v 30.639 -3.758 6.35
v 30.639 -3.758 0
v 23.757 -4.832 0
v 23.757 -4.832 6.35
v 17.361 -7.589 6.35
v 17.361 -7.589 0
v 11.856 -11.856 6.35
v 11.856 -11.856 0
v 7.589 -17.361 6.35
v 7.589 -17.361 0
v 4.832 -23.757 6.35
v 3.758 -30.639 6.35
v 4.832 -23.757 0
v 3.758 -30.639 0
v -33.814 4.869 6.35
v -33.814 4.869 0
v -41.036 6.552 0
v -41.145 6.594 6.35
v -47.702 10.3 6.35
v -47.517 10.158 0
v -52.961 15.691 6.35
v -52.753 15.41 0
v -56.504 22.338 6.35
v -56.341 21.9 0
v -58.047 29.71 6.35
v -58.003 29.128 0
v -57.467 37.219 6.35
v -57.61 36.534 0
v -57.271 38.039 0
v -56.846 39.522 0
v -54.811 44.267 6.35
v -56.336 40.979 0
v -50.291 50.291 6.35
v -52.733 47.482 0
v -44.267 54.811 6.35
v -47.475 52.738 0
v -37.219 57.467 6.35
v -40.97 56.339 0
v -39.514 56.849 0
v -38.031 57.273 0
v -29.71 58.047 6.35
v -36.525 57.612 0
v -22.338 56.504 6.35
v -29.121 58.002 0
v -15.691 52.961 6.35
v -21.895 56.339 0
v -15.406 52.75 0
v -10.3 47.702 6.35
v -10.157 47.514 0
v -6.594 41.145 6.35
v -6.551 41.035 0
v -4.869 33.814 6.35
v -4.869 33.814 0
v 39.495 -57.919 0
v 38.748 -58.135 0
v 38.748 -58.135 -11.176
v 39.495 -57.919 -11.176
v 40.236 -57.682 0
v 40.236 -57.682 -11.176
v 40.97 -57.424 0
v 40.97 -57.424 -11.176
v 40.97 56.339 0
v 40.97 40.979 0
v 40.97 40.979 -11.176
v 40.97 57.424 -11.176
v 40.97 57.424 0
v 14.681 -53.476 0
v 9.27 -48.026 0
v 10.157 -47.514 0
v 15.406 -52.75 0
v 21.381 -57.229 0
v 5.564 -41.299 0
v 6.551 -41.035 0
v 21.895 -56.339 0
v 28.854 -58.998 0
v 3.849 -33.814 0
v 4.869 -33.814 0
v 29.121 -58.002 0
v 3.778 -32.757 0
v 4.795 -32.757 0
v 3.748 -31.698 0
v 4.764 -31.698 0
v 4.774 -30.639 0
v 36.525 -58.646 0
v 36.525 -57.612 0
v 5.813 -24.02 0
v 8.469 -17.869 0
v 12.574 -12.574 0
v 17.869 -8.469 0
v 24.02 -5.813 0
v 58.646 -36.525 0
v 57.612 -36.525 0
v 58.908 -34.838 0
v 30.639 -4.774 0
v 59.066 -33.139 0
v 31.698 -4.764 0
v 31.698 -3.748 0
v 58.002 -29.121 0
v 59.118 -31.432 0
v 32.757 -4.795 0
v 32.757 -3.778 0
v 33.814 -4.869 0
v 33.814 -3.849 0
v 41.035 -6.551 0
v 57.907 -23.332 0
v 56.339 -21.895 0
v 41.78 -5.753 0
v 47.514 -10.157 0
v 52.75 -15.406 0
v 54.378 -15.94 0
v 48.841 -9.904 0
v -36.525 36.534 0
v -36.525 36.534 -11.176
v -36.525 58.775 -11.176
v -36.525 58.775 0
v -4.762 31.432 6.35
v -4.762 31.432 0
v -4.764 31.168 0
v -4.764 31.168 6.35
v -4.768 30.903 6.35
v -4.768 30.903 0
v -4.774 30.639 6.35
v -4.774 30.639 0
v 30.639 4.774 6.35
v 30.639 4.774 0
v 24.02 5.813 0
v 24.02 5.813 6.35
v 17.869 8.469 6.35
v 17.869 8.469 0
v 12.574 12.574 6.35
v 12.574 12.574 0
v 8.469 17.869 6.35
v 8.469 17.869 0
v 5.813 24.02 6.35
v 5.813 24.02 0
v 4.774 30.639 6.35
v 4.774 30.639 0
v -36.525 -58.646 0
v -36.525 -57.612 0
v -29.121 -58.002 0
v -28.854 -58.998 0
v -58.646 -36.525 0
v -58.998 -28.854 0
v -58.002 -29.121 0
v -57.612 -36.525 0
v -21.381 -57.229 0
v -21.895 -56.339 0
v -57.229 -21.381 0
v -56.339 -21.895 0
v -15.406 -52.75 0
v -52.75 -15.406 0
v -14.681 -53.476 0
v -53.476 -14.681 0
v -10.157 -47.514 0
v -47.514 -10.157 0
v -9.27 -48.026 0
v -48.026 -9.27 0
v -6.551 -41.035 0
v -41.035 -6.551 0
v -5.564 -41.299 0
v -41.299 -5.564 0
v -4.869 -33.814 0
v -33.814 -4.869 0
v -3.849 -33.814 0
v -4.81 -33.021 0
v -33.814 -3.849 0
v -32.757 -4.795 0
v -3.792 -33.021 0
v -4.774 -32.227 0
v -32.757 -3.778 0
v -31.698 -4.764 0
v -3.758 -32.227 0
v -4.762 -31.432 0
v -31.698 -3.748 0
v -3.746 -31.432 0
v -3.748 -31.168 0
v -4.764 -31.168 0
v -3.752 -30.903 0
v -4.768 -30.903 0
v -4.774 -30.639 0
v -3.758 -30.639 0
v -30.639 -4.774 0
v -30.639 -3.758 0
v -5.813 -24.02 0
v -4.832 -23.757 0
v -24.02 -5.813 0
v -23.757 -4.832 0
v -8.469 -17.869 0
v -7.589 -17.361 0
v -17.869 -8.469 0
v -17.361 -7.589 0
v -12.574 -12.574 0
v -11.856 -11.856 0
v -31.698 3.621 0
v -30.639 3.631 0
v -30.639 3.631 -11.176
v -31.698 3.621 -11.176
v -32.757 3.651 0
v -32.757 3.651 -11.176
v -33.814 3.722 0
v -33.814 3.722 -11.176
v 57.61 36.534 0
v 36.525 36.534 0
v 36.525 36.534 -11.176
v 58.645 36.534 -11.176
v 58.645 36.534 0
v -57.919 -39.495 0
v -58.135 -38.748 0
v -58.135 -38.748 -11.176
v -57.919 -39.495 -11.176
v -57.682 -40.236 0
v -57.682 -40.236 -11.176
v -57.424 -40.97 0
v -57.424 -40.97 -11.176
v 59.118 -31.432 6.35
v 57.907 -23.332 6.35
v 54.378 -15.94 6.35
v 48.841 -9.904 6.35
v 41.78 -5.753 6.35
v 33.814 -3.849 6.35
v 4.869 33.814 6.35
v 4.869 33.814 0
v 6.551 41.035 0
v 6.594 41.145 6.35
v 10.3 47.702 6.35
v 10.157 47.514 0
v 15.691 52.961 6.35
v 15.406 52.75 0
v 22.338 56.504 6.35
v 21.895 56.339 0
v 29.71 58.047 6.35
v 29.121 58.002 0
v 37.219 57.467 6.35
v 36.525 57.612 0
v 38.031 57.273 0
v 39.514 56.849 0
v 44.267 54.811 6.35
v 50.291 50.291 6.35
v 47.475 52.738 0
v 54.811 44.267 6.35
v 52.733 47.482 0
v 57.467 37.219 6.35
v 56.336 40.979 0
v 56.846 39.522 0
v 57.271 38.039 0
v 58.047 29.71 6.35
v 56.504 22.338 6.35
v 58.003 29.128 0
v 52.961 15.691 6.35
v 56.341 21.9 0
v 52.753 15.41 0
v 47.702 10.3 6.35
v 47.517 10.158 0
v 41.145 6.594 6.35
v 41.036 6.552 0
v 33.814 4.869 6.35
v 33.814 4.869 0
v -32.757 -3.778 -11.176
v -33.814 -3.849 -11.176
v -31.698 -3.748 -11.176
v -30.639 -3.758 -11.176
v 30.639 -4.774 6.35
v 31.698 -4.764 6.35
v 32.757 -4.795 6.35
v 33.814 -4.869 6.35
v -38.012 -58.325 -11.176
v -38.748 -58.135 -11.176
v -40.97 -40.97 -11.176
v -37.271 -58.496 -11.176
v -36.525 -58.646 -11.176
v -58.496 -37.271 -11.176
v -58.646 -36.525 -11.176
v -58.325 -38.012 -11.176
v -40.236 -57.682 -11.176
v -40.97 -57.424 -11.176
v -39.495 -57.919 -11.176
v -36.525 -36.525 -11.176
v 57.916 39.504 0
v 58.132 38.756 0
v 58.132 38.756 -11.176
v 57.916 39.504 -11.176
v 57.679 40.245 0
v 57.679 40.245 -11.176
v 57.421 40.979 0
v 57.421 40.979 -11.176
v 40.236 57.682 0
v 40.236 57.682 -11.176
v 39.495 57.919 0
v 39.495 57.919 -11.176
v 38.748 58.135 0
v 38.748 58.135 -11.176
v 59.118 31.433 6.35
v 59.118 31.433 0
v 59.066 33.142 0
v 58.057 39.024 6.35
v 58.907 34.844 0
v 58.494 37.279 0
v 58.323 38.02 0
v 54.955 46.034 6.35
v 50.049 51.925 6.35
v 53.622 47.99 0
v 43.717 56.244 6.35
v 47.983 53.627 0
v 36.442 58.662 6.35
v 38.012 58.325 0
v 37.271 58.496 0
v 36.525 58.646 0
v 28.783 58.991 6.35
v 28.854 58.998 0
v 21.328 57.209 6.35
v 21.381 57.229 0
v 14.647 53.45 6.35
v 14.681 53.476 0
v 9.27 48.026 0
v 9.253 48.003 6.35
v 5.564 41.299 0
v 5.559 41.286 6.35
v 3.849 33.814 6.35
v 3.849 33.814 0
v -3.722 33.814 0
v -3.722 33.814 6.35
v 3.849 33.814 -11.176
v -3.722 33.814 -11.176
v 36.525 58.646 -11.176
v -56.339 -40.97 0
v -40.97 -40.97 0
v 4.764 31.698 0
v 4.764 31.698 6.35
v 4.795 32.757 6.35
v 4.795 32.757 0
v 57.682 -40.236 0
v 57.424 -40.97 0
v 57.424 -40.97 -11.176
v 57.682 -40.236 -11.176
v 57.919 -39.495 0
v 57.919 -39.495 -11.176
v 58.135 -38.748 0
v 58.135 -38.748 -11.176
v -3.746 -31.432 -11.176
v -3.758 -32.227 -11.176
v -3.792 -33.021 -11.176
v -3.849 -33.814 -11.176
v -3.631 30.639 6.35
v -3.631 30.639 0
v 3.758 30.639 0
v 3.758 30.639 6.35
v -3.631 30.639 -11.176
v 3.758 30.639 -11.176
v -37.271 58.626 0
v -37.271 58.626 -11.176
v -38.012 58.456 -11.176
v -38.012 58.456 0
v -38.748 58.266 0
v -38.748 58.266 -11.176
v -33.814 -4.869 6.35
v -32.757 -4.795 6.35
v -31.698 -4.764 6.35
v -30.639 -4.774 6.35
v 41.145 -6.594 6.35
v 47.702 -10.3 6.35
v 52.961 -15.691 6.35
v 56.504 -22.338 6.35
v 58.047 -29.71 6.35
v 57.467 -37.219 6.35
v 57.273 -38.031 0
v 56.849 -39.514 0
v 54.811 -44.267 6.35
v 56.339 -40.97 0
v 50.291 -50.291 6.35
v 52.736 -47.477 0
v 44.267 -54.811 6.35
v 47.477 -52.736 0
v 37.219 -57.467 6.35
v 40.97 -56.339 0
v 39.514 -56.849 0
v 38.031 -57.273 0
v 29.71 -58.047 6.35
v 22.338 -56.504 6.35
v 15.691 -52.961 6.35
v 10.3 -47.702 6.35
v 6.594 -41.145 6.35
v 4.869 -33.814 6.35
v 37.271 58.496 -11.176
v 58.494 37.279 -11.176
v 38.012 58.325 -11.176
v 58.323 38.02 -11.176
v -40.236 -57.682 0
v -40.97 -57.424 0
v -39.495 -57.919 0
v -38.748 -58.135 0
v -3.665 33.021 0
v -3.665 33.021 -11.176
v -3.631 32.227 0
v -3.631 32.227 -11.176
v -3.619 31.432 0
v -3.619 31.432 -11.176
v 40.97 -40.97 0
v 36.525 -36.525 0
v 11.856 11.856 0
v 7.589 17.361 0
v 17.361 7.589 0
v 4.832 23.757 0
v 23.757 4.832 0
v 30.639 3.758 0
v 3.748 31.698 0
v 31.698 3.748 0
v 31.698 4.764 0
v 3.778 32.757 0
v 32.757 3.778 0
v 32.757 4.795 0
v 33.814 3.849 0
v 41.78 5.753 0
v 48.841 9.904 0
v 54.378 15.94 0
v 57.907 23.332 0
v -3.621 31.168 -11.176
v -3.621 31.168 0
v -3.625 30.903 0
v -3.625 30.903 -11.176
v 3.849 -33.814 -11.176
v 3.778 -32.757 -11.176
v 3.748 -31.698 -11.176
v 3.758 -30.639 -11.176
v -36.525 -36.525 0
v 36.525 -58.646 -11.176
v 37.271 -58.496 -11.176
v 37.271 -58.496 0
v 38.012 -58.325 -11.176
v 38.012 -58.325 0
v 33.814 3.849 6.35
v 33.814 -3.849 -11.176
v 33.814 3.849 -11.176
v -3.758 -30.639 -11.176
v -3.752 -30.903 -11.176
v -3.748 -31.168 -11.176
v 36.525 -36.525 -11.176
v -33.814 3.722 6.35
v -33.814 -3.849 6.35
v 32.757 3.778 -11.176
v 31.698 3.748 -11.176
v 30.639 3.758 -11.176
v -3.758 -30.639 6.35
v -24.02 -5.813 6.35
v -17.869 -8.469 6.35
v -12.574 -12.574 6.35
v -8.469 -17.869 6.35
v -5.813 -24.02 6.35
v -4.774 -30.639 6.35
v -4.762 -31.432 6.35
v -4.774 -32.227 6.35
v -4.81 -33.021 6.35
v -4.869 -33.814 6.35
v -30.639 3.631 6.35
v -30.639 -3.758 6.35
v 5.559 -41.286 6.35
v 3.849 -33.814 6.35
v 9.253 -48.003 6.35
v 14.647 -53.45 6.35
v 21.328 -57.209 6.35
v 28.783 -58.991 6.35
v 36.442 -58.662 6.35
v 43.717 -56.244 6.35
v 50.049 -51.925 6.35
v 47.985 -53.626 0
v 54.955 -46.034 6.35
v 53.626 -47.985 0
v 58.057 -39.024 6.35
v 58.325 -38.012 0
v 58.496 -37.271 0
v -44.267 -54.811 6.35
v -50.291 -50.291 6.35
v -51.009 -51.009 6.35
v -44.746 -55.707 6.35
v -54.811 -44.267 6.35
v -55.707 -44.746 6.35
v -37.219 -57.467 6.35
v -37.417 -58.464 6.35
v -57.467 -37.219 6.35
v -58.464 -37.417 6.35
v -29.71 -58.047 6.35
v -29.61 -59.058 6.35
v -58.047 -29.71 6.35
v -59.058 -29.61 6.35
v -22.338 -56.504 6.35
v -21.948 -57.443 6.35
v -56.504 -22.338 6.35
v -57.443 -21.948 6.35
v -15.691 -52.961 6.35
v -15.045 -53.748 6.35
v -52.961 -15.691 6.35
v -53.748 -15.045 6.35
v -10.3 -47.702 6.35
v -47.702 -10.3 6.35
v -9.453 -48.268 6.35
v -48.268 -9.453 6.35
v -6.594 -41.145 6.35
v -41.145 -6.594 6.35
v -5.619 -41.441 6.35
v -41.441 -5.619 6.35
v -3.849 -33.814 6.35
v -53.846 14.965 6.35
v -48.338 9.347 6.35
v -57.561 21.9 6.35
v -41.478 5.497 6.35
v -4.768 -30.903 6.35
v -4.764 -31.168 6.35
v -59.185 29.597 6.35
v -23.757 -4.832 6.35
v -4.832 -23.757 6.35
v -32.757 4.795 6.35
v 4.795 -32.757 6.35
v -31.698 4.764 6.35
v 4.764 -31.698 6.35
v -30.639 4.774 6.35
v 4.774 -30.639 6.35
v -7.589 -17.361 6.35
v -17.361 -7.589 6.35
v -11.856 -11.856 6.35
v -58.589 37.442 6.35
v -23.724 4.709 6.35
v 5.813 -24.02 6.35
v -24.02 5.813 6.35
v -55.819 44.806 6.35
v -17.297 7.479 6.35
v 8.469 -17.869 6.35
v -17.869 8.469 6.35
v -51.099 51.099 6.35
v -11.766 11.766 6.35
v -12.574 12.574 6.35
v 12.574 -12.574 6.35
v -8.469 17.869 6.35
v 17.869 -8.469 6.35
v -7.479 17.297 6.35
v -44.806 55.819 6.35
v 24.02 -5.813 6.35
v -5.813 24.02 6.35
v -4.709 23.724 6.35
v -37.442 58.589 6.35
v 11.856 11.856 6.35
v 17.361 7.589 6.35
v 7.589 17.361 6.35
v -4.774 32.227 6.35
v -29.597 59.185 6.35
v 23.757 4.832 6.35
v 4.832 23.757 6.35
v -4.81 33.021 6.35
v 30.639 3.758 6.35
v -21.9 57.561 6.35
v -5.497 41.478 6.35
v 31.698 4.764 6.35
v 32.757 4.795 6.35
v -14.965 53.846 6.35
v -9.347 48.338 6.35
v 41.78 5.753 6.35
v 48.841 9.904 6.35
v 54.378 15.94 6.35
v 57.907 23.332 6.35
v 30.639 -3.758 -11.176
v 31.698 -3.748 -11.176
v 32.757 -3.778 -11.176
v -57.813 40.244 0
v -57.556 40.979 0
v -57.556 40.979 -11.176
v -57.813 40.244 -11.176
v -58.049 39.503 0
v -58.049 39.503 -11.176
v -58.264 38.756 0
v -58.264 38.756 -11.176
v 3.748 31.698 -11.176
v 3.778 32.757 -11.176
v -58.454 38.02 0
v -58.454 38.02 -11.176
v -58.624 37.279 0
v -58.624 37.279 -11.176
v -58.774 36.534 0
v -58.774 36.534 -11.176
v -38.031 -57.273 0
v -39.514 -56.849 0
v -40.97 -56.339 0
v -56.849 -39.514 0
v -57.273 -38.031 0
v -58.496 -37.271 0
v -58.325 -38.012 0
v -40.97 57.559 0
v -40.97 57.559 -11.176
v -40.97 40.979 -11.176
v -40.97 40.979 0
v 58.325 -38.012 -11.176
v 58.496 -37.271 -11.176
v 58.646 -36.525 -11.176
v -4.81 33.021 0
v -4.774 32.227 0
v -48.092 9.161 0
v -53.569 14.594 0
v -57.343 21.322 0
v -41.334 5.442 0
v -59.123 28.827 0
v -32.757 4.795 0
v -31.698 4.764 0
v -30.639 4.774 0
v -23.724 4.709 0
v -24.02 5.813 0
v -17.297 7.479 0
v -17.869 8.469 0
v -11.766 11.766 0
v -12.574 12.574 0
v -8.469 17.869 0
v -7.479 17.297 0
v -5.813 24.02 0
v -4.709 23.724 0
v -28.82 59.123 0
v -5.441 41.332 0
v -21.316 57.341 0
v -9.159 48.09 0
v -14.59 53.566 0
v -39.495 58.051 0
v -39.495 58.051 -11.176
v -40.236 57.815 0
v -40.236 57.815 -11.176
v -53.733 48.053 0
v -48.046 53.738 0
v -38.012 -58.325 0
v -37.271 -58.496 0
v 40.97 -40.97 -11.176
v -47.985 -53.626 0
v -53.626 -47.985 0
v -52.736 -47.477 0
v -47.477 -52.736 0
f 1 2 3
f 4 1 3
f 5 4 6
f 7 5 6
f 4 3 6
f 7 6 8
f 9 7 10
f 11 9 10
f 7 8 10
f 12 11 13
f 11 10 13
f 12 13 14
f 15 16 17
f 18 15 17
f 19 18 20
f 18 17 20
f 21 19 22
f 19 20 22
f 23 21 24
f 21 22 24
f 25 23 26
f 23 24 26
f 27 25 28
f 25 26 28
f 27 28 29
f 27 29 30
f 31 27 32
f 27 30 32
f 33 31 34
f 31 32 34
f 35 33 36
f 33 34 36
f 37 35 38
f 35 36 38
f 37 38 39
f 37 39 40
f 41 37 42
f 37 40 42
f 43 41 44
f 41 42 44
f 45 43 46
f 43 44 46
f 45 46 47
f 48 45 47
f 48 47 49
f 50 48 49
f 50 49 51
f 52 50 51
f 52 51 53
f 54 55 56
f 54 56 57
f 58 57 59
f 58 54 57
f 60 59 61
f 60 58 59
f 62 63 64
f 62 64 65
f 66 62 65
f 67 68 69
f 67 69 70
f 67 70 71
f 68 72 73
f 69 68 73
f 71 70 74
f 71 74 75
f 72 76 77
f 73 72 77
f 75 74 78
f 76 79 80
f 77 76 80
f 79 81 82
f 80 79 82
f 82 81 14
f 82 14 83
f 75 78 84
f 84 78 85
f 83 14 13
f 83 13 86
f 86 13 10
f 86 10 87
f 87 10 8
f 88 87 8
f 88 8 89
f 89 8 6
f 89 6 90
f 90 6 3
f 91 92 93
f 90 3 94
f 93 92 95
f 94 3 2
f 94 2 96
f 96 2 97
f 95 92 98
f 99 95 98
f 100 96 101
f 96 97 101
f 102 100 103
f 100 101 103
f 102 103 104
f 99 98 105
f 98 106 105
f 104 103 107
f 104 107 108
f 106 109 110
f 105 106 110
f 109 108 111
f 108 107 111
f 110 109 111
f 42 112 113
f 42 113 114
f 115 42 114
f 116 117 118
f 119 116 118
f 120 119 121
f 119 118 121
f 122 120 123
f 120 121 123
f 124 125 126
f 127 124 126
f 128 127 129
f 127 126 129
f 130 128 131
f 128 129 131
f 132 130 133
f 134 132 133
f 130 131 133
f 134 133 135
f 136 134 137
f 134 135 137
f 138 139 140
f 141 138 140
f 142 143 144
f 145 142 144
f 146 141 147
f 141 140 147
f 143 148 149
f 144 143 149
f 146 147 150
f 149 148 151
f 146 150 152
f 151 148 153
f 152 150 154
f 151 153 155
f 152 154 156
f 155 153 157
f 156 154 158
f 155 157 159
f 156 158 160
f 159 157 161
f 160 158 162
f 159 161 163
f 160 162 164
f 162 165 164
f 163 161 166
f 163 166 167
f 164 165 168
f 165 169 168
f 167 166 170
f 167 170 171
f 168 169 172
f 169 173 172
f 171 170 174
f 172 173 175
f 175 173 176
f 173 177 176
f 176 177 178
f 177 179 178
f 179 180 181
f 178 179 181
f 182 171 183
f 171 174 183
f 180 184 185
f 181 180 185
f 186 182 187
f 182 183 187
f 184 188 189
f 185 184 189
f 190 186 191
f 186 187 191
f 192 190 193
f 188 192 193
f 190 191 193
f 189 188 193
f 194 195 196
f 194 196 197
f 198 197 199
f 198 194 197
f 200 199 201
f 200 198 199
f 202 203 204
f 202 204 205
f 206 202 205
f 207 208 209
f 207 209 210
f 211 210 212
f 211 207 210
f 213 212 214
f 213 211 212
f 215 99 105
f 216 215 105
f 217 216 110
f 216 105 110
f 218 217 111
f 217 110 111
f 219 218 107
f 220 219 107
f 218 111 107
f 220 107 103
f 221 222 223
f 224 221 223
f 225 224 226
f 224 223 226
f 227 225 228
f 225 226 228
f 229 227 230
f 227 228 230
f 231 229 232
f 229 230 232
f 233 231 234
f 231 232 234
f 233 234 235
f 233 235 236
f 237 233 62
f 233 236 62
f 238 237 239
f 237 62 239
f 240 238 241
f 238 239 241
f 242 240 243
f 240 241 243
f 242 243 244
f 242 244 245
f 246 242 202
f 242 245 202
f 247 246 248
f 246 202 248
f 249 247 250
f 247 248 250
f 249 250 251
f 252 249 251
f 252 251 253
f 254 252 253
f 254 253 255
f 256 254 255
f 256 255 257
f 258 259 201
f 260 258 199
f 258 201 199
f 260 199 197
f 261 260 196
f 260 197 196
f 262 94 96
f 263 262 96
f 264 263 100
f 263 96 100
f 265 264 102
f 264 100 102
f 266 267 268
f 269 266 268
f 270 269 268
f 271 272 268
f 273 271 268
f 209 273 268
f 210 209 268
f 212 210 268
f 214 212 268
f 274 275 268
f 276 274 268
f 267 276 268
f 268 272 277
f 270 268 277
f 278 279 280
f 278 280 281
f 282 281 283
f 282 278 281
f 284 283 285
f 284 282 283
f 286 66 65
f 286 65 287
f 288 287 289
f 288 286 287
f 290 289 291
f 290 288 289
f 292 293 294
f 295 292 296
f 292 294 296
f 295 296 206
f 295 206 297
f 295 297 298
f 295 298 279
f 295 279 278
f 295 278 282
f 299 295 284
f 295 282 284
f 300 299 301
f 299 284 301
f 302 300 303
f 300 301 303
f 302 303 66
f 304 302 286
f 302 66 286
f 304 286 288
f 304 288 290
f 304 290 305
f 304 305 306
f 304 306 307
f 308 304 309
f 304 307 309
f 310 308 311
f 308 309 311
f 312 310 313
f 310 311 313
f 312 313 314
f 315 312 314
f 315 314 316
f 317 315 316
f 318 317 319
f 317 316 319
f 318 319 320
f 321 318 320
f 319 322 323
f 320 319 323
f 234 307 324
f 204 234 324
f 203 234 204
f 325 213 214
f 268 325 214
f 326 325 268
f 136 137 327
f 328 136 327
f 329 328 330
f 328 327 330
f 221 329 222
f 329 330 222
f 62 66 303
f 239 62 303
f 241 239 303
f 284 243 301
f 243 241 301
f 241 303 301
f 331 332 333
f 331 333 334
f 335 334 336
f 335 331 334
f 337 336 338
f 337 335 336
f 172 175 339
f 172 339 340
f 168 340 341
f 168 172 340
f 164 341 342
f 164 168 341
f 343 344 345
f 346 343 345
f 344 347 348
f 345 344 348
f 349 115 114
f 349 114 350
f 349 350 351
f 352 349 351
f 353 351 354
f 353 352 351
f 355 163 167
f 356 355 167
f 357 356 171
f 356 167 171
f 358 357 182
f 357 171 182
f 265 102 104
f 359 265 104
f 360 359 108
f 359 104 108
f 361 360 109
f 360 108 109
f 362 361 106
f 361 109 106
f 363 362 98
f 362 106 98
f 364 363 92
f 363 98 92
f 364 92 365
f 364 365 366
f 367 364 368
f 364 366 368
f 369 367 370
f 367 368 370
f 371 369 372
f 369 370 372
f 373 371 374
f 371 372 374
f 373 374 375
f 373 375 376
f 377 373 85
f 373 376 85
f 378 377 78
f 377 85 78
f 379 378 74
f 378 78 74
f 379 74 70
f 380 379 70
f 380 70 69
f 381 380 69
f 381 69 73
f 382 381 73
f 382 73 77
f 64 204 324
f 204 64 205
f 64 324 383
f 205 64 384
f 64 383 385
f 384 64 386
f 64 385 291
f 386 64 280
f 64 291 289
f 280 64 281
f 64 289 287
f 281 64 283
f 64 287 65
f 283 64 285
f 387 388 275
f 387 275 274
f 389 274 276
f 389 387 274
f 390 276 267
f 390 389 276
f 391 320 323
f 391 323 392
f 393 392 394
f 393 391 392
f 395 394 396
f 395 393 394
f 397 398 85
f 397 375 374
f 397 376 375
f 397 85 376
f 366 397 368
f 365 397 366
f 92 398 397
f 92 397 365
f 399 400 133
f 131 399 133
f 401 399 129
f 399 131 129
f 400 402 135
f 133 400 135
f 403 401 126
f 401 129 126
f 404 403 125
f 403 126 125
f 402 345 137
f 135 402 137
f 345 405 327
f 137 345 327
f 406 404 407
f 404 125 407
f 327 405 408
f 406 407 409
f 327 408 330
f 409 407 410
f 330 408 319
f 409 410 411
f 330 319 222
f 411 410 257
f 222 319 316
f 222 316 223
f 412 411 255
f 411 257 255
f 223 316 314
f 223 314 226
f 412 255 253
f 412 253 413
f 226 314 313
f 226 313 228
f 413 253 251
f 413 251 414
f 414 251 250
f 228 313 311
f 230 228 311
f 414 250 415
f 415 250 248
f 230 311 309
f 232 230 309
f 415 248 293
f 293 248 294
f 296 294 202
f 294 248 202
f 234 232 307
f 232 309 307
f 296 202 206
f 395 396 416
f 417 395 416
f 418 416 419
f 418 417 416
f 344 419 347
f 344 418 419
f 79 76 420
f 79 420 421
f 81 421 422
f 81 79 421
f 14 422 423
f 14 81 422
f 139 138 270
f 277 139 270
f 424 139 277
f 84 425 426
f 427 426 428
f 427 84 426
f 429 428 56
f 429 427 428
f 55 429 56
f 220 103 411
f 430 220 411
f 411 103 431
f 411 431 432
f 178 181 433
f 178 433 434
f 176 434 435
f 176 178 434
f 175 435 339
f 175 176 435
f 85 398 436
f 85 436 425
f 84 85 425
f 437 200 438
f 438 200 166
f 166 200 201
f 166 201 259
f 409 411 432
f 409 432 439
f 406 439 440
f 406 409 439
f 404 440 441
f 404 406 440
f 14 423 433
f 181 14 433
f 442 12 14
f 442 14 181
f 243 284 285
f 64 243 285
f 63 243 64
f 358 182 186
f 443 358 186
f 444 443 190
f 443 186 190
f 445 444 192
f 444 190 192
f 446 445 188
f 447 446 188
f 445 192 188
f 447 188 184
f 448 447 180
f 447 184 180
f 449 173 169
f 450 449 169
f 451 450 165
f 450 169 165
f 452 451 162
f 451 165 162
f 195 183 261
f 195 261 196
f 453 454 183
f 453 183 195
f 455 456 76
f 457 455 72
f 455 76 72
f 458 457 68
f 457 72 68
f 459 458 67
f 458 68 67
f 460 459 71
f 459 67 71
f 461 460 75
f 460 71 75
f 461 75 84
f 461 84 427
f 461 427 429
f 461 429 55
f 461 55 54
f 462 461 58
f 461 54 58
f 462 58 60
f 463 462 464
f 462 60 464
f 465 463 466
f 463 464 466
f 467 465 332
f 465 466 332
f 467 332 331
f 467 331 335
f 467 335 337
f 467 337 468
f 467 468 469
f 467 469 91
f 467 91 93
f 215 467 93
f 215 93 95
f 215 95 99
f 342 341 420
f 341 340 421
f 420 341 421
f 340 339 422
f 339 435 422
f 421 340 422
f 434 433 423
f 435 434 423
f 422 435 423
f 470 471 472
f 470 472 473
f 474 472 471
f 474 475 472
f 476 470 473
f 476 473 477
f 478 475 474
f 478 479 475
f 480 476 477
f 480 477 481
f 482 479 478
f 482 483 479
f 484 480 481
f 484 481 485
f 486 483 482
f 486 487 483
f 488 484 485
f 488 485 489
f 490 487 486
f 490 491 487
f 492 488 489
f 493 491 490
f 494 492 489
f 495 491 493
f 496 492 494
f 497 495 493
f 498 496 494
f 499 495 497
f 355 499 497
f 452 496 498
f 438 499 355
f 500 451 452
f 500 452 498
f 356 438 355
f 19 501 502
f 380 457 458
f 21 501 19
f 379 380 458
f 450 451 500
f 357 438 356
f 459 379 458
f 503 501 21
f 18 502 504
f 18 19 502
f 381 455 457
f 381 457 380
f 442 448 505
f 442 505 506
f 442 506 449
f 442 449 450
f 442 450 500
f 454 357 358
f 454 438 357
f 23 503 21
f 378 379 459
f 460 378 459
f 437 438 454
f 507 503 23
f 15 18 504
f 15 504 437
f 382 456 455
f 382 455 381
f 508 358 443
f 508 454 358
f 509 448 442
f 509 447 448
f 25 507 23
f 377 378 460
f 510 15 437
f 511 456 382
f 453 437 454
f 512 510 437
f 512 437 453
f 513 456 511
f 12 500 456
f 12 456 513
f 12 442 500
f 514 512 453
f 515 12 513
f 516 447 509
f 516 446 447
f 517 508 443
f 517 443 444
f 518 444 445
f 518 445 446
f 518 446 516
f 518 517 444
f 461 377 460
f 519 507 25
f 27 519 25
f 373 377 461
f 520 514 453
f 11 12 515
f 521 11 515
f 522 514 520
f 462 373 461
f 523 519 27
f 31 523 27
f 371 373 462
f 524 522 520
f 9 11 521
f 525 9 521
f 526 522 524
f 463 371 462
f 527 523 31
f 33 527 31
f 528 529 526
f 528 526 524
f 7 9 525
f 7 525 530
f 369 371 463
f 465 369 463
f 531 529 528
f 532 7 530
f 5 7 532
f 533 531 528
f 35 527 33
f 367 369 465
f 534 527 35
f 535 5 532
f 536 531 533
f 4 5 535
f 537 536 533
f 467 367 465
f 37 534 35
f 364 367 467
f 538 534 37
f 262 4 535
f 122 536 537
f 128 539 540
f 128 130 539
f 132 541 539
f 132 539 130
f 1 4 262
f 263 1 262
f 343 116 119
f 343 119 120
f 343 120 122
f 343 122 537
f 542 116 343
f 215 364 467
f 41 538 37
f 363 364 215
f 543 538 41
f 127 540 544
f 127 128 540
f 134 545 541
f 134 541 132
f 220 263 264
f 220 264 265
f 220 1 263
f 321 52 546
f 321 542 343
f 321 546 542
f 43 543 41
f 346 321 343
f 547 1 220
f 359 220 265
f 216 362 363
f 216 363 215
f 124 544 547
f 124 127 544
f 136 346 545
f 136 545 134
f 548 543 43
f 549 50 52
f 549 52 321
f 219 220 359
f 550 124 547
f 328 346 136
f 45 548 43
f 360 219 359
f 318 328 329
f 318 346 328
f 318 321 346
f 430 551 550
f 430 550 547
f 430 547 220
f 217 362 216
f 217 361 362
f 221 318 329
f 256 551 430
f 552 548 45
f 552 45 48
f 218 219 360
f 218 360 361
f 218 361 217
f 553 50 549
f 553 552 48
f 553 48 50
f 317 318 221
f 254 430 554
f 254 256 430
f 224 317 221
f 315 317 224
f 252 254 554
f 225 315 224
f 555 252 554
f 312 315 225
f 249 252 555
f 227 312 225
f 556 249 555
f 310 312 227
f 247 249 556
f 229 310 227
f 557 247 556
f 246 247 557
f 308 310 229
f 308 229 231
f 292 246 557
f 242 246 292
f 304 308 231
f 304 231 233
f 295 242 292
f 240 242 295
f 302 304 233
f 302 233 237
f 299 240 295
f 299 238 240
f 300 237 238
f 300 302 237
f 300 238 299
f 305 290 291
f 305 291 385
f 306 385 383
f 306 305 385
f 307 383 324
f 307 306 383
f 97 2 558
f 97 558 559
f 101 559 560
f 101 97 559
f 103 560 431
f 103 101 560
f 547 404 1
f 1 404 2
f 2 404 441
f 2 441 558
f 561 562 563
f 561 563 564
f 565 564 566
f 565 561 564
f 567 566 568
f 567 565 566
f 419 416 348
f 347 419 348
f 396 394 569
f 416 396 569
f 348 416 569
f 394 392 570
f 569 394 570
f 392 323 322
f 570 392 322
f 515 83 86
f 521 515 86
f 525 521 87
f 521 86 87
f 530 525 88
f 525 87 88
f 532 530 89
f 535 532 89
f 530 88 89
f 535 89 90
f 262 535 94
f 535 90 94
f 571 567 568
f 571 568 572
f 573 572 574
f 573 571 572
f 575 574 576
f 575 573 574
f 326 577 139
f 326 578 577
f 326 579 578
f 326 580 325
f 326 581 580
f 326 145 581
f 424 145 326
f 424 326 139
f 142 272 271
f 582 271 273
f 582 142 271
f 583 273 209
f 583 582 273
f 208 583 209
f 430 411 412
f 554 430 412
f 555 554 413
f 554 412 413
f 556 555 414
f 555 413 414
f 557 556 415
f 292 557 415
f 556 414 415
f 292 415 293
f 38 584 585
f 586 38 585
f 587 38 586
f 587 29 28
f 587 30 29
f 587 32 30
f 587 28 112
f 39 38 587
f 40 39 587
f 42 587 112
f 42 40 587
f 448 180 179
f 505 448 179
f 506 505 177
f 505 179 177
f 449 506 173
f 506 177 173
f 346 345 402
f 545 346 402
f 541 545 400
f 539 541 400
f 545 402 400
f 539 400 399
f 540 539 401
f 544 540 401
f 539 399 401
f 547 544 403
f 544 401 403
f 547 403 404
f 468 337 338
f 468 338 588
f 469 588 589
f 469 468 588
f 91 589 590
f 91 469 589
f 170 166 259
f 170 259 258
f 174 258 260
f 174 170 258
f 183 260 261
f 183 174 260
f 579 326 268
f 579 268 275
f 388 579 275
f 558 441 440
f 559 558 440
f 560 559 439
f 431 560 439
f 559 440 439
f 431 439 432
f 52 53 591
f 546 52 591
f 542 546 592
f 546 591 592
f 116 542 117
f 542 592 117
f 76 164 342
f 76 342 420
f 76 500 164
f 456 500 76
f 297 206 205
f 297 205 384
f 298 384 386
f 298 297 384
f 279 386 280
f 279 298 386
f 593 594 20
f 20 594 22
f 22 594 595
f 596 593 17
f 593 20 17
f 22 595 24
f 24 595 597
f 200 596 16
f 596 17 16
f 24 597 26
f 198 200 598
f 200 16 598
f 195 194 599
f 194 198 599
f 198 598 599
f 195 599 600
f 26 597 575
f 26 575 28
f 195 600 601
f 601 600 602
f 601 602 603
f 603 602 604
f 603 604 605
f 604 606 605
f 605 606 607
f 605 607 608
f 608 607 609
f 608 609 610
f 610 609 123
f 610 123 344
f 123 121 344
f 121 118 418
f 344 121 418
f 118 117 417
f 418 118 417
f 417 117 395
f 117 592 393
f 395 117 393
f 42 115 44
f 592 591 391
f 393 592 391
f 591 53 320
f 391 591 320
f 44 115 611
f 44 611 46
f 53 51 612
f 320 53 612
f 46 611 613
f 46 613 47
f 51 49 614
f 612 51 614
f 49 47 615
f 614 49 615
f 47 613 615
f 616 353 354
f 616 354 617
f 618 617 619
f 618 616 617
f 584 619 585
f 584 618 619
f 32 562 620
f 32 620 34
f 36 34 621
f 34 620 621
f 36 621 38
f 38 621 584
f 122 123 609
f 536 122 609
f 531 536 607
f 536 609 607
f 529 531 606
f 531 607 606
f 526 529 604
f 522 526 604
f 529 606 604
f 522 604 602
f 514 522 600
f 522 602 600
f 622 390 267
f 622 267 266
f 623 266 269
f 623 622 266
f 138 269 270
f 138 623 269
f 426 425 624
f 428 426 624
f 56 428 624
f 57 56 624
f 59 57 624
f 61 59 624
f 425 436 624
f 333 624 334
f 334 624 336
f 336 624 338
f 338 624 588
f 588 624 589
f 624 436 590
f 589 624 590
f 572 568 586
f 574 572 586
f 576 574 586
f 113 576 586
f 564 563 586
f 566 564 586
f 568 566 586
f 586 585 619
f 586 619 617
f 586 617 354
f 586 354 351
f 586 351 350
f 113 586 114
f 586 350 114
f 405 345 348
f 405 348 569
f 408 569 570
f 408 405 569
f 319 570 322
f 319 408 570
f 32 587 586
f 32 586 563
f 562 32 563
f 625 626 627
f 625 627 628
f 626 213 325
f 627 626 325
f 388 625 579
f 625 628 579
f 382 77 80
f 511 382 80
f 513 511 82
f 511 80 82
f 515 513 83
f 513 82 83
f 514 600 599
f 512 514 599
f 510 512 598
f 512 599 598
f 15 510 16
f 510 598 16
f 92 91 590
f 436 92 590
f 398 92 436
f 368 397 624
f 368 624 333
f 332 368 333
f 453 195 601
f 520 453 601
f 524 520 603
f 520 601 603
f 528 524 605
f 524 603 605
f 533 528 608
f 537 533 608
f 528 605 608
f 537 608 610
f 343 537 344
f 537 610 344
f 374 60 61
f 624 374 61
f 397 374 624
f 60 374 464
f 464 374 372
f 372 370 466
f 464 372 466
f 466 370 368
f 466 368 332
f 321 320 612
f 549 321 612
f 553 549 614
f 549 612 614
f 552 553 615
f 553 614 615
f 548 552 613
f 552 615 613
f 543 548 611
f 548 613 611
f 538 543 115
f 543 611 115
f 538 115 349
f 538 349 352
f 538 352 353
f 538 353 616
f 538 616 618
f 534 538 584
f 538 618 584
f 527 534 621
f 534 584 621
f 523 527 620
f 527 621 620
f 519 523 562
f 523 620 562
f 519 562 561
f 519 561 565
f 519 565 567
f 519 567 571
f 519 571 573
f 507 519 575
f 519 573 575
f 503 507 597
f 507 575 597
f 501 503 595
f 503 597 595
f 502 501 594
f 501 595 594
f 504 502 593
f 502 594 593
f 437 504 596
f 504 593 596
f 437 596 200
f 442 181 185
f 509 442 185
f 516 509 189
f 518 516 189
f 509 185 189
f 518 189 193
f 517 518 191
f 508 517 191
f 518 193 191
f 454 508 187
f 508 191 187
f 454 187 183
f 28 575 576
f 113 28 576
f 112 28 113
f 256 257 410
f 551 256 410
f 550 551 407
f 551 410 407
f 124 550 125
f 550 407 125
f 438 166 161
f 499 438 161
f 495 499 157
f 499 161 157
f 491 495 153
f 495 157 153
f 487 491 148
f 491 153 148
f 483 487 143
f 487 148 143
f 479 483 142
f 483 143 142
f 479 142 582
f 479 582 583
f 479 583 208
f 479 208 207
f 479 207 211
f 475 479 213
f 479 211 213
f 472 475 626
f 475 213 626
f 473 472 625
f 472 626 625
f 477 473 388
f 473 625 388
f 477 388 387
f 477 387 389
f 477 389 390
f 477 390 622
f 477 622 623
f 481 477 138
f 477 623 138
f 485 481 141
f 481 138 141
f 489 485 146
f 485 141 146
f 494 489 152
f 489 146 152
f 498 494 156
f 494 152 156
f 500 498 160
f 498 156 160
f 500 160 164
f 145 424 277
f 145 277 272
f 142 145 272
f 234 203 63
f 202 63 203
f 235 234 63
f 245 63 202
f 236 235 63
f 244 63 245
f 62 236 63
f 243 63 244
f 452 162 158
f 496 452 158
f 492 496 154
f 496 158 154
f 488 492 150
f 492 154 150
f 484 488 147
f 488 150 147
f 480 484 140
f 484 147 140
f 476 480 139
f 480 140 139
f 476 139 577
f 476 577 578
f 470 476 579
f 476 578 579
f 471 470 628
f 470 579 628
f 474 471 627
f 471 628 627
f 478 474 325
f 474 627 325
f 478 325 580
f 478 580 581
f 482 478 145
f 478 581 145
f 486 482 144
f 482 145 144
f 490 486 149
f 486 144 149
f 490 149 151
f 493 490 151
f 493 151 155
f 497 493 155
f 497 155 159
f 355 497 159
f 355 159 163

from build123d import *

# Parameters (mm, degrees)
F1_DEPTH = 6.35
F2_DEPTH = 11.176
F4_DEPTH = 11.176


with BuildPart() as f1:
    # F0 (on Top) → F1 (new body)
    with BuildSketch(Plane.XY):
        with BuildLine():
            ThreePointArc((-4.8690185181, 33.81375), (-4.7891429375, 32.6243156063), (-4.7625, 31.4325))
            ThreePointArc((-4.7625, 31.4325), (-4.7654537568, 31.0355810404), (-4.7743143727, 30.63875))
            Line((-4.7743143727, 30.63875), (-3.6308286485, 30.63875))
            ThreePointArc((-3.6308286485, 30.63875), (-3.6223323063, 31.0355845806), (-3.6195, 31.4325))
            ThreePointArc((-3.6195, 31.4325), (-3.64504287, 32.6242194499), (-3.7216245639, 33.81375))
            Line((-3.7216245639, 33.81375), (-4.8690185181, 33.81375))
        make_face()
        with BuildLine():
            ThreePointArc((-33.81375, 4.8690185181), (-50.2910378542, 50.2910378542), (-4.8690185181, 33.81375))
            Line((-4.8690185181, 33.81375), (-3.7216245639, 33.81375))
            ThreePointArc((-3.7216245639, 33.81375), (-51.0992609051, 51.0992609051), (-33.81375, 3.7216245639))
            Line((-33.81375, 3.7216245639), (-33.81375, 4.8690185181))
        make_face()
        with BuildLine():
            ThreePointArc((-30.63875, 4.7743143727), (-32.2276611669, 4.7743564277), (-33.81375, 4.8690185181))
            Line((-33.81375, 4.8690185181), (-33.81375, 3.7216245639))
            ThreePointArc((-33.81375, 3.7216245639), (-32.2275471917, 3.6308657142), (-30.63875, 3.6308286485))
            Line((-30.63875, 3.6308286485), (-30.63875, 4.7743143727))
        make_face()
        with BuildLine():
            Line((3.8490947636, 33.81375), (-3.7216245639, 33.81375))
            ThreePointArc((-3.7216245639, 33.81375), (-3.64504287, 32.6242194499), (-3.6195, 31.4325))
            ThreePointArc((-3.6195, 31.4325), (-3.6223323063, 31.0355845806), (-3.6308286485, 30.63875))
            Line((-3.6308286485, 30.63875), (3.7578806361, 30.63875))
            ThreePointArc((3.7578806361, 30.63875), (3.7579182157, 32.2275591593), (3.8490947636, 33.81375))
        make_face()
        with BuildLine():
            ThreePointArc((-30.63875, 3.6308286485), (-32.2275471917, 3.6308657142), (-33.81375, 3.7216245639))
            Line((-33.81375, 3.7216245639), (-33.81375, -3.8490947636))
            ThreePointArc((-33.81375, -3.8490947636), (-32.2275591593, -3.7579182157), (-30.63875, -3.7578806361))
            Line((-30.63875, -3.7578806361), (-30.63875, 3.6308286485))
        make_face()
        with BuildLine():
            Line((4.8690185181, 33.81375), (3.8490947636, 33.81375))
            ThreePointArc((3.8490947636, 33.81375), (3.7579182157, 32.2275591593), (3.7578806361, 30.63875))
            Line((3.7578806361, 30.63875), (4.7743143727, 30.63875))
            ThreePointArc((4.7743143727, 30.63875), (4.7743564277, 32.2276611669), (4.8690185181, 33.81375))
        make_face()
        with BuildLine():
            ThreePointArc((59.1185, 31.4325), (32.6242295465, 59.0928394174), (3.8490947636, 33.81375))
            Line((3.8490947636, 33.81375), (4.8690185181, 33.81375))
            ThreePointArc((4.8690185181, 33.81375), (32.6243156063, 58.0758570625), (58.1025, 31.4325))
            ThreePointArc((58.1025, 31.4325), (51.1149393496, 13.4355424446), (33.81375, 4.8690185181))
            Line((33.81375, 4.8690185181), (33.81375, 3.8490947636))
            ThreePointArc((33.81375, 3.8490947636), (51.8339936157, 12.7163664717), (59.1185, 31.4325))
        make_face()
        with BuildLine():
            Line((-33.81375, -4.8690185181), (-33.81375, -3.8490947636))
            ThreePointArc((-33.81375, -3.8490947636), (-51.0094583439, -51.0094583439), (-3.8490947636, -33.81375))
            Line((-3.8490947636, -33.81375), (-4.8690185181, -33.81375))
            ThreePointArc((-4.8690185181, -33.81375), (-50.2910378542, -50.2910378542), (-33.81375, -4.8690185181))
        make_face()
        with BuildLine():
            ThreePointArc((-30.63875, -3.7578806361), (-32.2275591593, -3.7579182157), (-33.81375, -3.8490947636))
            Line((-33.81375, -3.8490947636), (-33.81375, -4.8690185181))
            ThreePointArc((-33.81375, -4.8690185181), (-32.2276611669, -4.7743564277), (-30.63875, -4.7743143727))
            Line((-30.63875, -4.7743143727), (-30.63875, -3.7578806361))
        make_face()
        with BuildLine():
            Line((30.63875, 4.7743143727), (30.63875, 3.7578806361))
            ThreePointArc((30.63875, 3.7578806361), (32.2275591593, 3.7579182157), (33.81375, 3.8490947636))
            Line((33.81375, 3.8490947636), (33.81375, 4.8690185181))
            ThreePointArc((33.81375, 4.8690185181), (32.2276611669, 4.7743564277), (30.63875, 4.7743143727))
        make_face()
        with BuildLine():
            ThreePointArc((33.81375, 3.8490947636), (32.2275591593, 3.7579182157), (30.63875, 3.7578806361))
            Line((30.63875, 3.7578806361), (30.63875, -3.7578806361))
            ThreePointArc((30.63875, -3.7578806361), (32.2275591593, -3.7579182157), (33.81375, -3.8490947636))
            Line((33.81375, -3.8490947636), (33.81375, 3.8490947636))
        make_face()
        with BuildLine():
            Line((-4.8690185181, -33.81375), (-3.8490947636, -33.81375))
            ThreePointArc((-3.8490947636, -33.81375), (-3.7721605826, -32.6242295465), (-3.7465, -31.4325))
            ThreePointArc((-3.7465, -31.4325), (-3.7493453052, -31.0355842087), (-3.7578806361, -30.63875))
            Line((-3.7578806361, -30.63875), (-4.7743143727, -30.63875))
            ThreePointArc((-4.7743143727, -30.63875), (-4.7654537568, -31.0355810404), (-4.7625, -31.4325))
            ThreePointArc((-4.7625, -31.4325), (-4.7891429375, -32.6243156063), (-4.8690185181, -33.81375))
        make_face()
        with BuildLine():
            ThreePointArc((-3.7465, -31.4325), (-3.7721605826, -32.6242295465), (-3.8490947636, -33.81375))
            Line((-3.8490947636, -33.81375), (3.8490947636, -33.81375))
            ThreePointArc((3.8490947636, -33.81375), (3.7579182157, -32.2275591593), (3.7578806361, -30.63875))
            Line((3.7578806361, -30.63875), (-3.7578806361, -30.63875))
            ThreePointArc((-3.7578806361, -30.63875), (-3.7493453052, -31.0355842087), (-3.7465, -31.4325))
        make_face()
        with BuildLine():
            ThreePointArc((33.81375, -3.8490947636), (32.2275591593, -3.7579182157), (30.63875, -3.7578806361))
            Line((30.63875, -3.7578806361), (30.63875, -4.7743143727))
            ThreePointArc((30.63875, -4.7743143727), (32.2276611669, -4.7743564277), (33.81375, -4.8690185181))
            Line((33.81375, -4.8690185181), (33.81375, -3.8490947636))
        make_face()
        with BuildLine():
            Line((4.8690185181, -33.81375), (3.8490947636, -33.81375))
            ThreePointArc((3.8490947636, -33.81375), (32.6242295465, -59.0928394174), (59.1185, -31.4325))
            ThreePointArc((59.1185, -31.4325), (51.8339936157, -12.7163664717), (33.81375, -3.8490947636))
            Line((33.81375, -3.8490947636), (33.81375, -4.8690185181))
            ThreePointArc((33.81375, -4.8690185181), (51.1149393496, -13.4355424446), (58.1025, -31.4325))
            ThreePointArc((58.1025, -31.4325), (32.6243156063, -58.0758570625), (4.8690185181, -33.81375))
        make_face()
        with BuildLine():
            ThreePointArc((3.7578806361, -30.63875), (3.7579182157, -32.2275591593), (3.8490947636, -33.81375))
            Line((3.8490947636, -33.81375), (4.8690185181, -33.81375))
            ThreePointArc((4.8690185181, -33.81375), (4.7743564277, -32.2276611669), (4.7743143727, -30.63875))
            Line((4.7743143727, -30.63875), (3.7578806361, -30.63875))
        make_face()
        with BuildLine():
            Line((-3.6308286485, 30.63875), (-4.7743143727, 30.63875))
            ThreePointArc((-4.7743143727, 30.63875), (-12.5739621458, 12.5739621458), (-30.63875, 4.7743143727))
            Line((-30.63875, 4.7743143727), (-30.63875, 3.6308286485))
            ThreePointArc((-30.63875, 3.6308286485), (-11.7657390949, 11.7657390949), (-3.6308286485, 30.63875))
        make_face()
        with BuildLine():
            ThreePointArc((-3.7578806361, -30.63875), (-11.8555416561, -11.8555416561), (-30.63875, -3.7578806361))
            Line((-30.63875, -3.7578806361), (-30.63875, -4.7743143727))
            ThreePointArc((-30.63875, -4.7743143727), (-12.5739621458, -12.5739621458), (-4.7743143727, -30.63875))
            Line((-4.7743143727, -30.63875), (-3.7578806361, -30.63875))
        make_face()
        with BuildLine():
            Line((30.63875, -4.7743143727), (30.63875, -3.7578806361))
            ThreePointArc((30.63875, -3.7578806361), (11.8555416561, -11.8555416561), (3.7578806361, -30.63875))
            Line((3.7578806361, -30.63875), (4.7743143727, -30.63875))
            ThreePointArc((4.7743143727, -30.63875), (12.5739621458, -12.5739621458), (30.63875, -4.7743143727))
        make_face()
        with BuildLine():
            Line((4.7743143727, 30.63875), (3.7578806361, 30.63875))
            ThreePointArc((3.7578806361, 30.63875), (11.8555416561, 11.8555416561), (30.63875, 3.7578806361))
            Line((30.63875, 3.7578806361), (30.63875, 4.7743143727))
            ThreePointArc((30.63875, 4.7743143727), (12.5739621458, 12.5739621458), (4.7743143727, 30.63875))
        make_face()
    extrude(amount=F1_DEPTH)

    # F0 (on Top) → F2 (join)
    with BuildSketch(Plane.XY):
        with BuildLine():
            ThreePointArc((-3.7465, -31.4325), (-3.7721605826, -32.6242295465), (-3.8490947636, -33.81375))
            Line((-3.8490947636, -33.81375), (3.8490947636, -33.81375))
            ThreePointArc((3.8490947636, -33.81375), (3.7579182157, -32.2275591593), (3.7578806361, -30.63875))
            Line((3.7578806361, -30.63875), (-3.7578806361, -30.63875))
            ThreePointArc((-3.7578806361, -30.63875), (-3.7493453052, -31.0355842087), (-3.7465, -31.4325))
        make_face()
        with BuildLine():
            ThreePointArc((-30.63875, 3.6308286485), (-32.2275471917, 3.6308657142), (-33.81375, 3.7216245639))
            Line((-33.81375, 3.7216245639), (-33.81375, -3.8490947636))
            ThreePointArc((-33.81375, -3.8490947636), (-32.2275591593, -3.7579182157), (-30.63875, -3.7578806361))
            Line((-30.63875, -3.7578806361), (-30.63875, 3.6308286485))
        make_face()
        with BuildLine():
            Line((3.8490947636, 33.81375), (-3.7216245639, 33.81375))
            ThreePointArc((-3.7216245639, 33.81375), (-3.64504287, 32.6242194499), (-3.6195, 31.4325))
            ThreePointArc((-3.6195, 31.4325), (-3.6223323063, 31.0355845806), (-3.6308286485, 30.63875))
            Line((-3.6308286485, 30.63875), (3.7578806361, 30.63875))
            ThreePointArc((3.7578806361, 30.63875), (3.7579182157, 32.2275591593), (3.8490947636, 33.81375))
        make_face()
        with BuildLine():
            ThreePointArc((33.81375, 3.8490947636), (32.2275591593, 3.7579182157), (30.63875, 3.7578806361))
            Line((30.63875, 3.7578806361), (30.63875, -3.7578806361))
            ThreePointArc((30.63875, -3.7578806361), (32.2275591593, -3.7579182157), (33.81375, -3.8490947636))
            Line((33.81375, -3.8490947636), (33.81375, 3.8490947636))
        make_face()
    extrude(amount=-F2_DEPTH)

    # F3 (on Top) → F4 (join)
    with BuildSketch(Plane.XY):
        with BuildLine():
            Line((-38.7477, 58.2662626501), (-38.7477, 38.7561204209))
            Line((-38.7477, 38.7561204209), (-58.2639657246, 38.7561204209))
            ThreePointArc((-58.2639657246, 38.7561204209), (-58.5416214169, 37.650096401), (-58.7737058888, 36.5336204209))
            Line((-58.7737058888, 36.5336204209), (-36.5252, 36.5336204209))
            Line((-36.5252, 36.5336204209), (-36.5252, 58.775275567))
            ThreePointArc((-36.5252, 58.775275567), (-37.641668152, 58.5435530939), (-38.7477, 58.2662626501))
        make_face()
        with BuildLine():
            Line((-58.2639657246, 38.7561204209), (-38.7477, 38.7561204209))
            Line((-38.7477, 38.7561204209), (-38.7477, 58.2662626501))
            ThreePointArc((-38.7477, 58.2662626501), (-39.8663666273, 57.9359500153), (-40.9702, 57.5590238352))
            Line((-40.9702, 57.5590238352), (-40.9702, 40.9786204209))
            Line((-40.9702, 40.9786204209), (-57.5559483541, 40.9786204209))
            ThreePointArc((-57.5559483541, 40.9786204209), (-57.9332661744, 39.8747959654), (-58.2639657246, 38.7561204209))
        make_face()
        with BuildLine():
            ThreePointArc((58.6445040874, 36.5336204209), (58.4112965044, 37.6501470771), (58.1322973762, 38.7561204209))
            Line((58.1322973762, 38.7561204209), (38.7477, 38.7561204209))
            Line((38.7477, 38.7561204209), (38.7477, 58.1346056278))
            ThreePointArc((38.7477, 58.1346056278), (37.6417187449, 58.413237547), (36.5252, 58.646081218))
            Line((36.5252, 58.646081218), (36.5252, 36.5336204209))
            Line((36.5252, 36.5336204209), (58.6445040874, 36.5336204209))
        make_face()
        with BuildLine():
            Line((38.7477, 38.7561204209), (58.1322973762, 38.7561204209))
            ThreePointArc((58.1322973762, 38.7561204209), (57.7999223583, 39.8748713598), (57.4206931059, 40.9786204209))
            Line((57.4206931059, 40.9786204209), (40.9702, 40.9786204209))
            Line((40.9702, 40.9786204209), (40.9702, 57.4237845914))
            ThreePointArc((40.9702, 57.4237845914), (39.8664419158, 57.8026198283), (38.7477, 58.1346056278))
            Line((38.7477, 58.1346056278), (38.7477, 38.7561204209))
        make_face()
        with BuildLine():
            Line((-58.1346056278, -38.7477), (-38.7477, -38.7477))
            Line((-38.7477, -38.7477), (-38.7477, -58.1346056278))
            ThreePointArc((-38.7477, -58.1346056278), (-37.6417187449, -58.413237547), (-36.5252, -58.646081218))
            Line((-36.5252, -58.646081218), (-36.5252, -36.5252))
            Line((-36.5252, -36.5252), (-58.646081218, -36.5252))
            ThreePointArc((-58.646081218, -36.5252), (-58.413237547, -37.6417187449), (-58.1346056278, -38.7477))
        make_face()
        with BuildLine():
            Line((-38.7477, -58.1346056278), (-38.7477, -38.7477))
            Line((-38.7477, -38.7477), (-58.1346056278, -38.7477))
            ThreePointArc((-58.1346056278, -38.7477), (-57.8026198283, -39.8664419158), (-57.4237845914, -40.9702))
            Line((-57.4237845914, -40.9702), (-40.9702, -40.9702))
            Line((-40.9702, -40.9702), (-40.9702, -57.4237845914))
            ThreePointArc((-40.9702, -57.4237845914), (-39.8664419158, -57.8026198283), (-38.7477, -58.1346056278))
        make_face()
        with BuildLine():
            ThreePointArc((36.5252, -58.646081218), (37.6417187449, -58.413237547), (38.7477, -58.1346056278))
            Line((38.7477, -58.1346056278), (38.7477, -38.7477))
            Line((38.7477, -38.7477), (58.1346056278, -38.7477))
            ThreePointArc((58.1346056278, -38.7477), (58.413237547, -37.6417187449), (58.646081218, -36.5252))
            Line((58.646081218, -36.5252), (36.5252, -36.5252))
            Line((36.5252, -36.5252), (36.5252, -58.646081218))
        make_face()
        with BuildLine():
            Line((38.7477, -38.7477), (38.7477, -58.1346056278))
            ThreePointArc((38.7477, -58.1346056278), (39.8664419158, -57.8026198283), (40.9702, -57.4237845914))
            Line((40.9702, -57.4237845914), (40.9702, -40.9702))
            Line((40.9702, -40.9702), (57.4237845914, -40.9702))
            ThreePointArc((57.4237845914, -40.9702), (57.8026198283, -39.8664419158), (58.1346056278, -38.7477))
            Line((58.1346056278, -38.7477), (38.7477, -38.7477))
        make_face()
    extrude(amount=-F4_DEPTH)


solid = f1.part
